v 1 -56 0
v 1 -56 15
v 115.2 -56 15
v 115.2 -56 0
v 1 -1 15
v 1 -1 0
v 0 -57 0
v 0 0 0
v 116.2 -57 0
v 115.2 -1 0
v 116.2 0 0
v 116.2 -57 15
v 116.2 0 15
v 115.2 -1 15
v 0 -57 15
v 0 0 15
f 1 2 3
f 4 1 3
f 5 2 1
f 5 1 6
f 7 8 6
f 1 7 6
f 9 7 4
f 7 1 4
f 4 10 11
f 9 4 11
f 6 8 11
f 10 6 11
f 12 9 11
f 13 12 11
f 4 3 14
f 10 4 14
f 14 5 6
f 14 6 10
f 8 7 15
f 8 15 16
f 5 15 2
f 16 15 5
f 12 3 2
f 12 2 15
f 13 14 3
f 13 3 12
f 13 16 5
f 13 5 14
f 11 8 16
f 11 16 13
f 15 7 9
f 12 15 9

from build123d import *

# Parameters (mm, degrees)
F0_W     = 116.2
F0_H     = 57
F1_DEPTH = 15
F2_T     = -1
F3_DEPTH = 1.001


with BuildPart() as f1:
    # F0 (on Top) → F1 (new body)
    with BuildSketch(Plane.XY):
        with Locations((58.1, -28.5)):
            Rectangle(F0_W, F0_H)
    extrude(amount=F1_DEPTH)

    # F2
    f2_openings = [f1.faces().sort_by_distance(p)[0] for p in [
        (58.1, -28.5, 15),
    ]]
    offset(amount=F2_T, openings=f2_openings)

    # F3 (cut, through all): a face of the model
    f3_faces = [f1.faces().sort_by_distance(p)[0] for p in [
        (58.1, -28.5, 1),
    ]]
    extrude(f3_faces, amount=-F3_DEPTH, mode=Mode.SUBTRACT)


solid = f1.part
